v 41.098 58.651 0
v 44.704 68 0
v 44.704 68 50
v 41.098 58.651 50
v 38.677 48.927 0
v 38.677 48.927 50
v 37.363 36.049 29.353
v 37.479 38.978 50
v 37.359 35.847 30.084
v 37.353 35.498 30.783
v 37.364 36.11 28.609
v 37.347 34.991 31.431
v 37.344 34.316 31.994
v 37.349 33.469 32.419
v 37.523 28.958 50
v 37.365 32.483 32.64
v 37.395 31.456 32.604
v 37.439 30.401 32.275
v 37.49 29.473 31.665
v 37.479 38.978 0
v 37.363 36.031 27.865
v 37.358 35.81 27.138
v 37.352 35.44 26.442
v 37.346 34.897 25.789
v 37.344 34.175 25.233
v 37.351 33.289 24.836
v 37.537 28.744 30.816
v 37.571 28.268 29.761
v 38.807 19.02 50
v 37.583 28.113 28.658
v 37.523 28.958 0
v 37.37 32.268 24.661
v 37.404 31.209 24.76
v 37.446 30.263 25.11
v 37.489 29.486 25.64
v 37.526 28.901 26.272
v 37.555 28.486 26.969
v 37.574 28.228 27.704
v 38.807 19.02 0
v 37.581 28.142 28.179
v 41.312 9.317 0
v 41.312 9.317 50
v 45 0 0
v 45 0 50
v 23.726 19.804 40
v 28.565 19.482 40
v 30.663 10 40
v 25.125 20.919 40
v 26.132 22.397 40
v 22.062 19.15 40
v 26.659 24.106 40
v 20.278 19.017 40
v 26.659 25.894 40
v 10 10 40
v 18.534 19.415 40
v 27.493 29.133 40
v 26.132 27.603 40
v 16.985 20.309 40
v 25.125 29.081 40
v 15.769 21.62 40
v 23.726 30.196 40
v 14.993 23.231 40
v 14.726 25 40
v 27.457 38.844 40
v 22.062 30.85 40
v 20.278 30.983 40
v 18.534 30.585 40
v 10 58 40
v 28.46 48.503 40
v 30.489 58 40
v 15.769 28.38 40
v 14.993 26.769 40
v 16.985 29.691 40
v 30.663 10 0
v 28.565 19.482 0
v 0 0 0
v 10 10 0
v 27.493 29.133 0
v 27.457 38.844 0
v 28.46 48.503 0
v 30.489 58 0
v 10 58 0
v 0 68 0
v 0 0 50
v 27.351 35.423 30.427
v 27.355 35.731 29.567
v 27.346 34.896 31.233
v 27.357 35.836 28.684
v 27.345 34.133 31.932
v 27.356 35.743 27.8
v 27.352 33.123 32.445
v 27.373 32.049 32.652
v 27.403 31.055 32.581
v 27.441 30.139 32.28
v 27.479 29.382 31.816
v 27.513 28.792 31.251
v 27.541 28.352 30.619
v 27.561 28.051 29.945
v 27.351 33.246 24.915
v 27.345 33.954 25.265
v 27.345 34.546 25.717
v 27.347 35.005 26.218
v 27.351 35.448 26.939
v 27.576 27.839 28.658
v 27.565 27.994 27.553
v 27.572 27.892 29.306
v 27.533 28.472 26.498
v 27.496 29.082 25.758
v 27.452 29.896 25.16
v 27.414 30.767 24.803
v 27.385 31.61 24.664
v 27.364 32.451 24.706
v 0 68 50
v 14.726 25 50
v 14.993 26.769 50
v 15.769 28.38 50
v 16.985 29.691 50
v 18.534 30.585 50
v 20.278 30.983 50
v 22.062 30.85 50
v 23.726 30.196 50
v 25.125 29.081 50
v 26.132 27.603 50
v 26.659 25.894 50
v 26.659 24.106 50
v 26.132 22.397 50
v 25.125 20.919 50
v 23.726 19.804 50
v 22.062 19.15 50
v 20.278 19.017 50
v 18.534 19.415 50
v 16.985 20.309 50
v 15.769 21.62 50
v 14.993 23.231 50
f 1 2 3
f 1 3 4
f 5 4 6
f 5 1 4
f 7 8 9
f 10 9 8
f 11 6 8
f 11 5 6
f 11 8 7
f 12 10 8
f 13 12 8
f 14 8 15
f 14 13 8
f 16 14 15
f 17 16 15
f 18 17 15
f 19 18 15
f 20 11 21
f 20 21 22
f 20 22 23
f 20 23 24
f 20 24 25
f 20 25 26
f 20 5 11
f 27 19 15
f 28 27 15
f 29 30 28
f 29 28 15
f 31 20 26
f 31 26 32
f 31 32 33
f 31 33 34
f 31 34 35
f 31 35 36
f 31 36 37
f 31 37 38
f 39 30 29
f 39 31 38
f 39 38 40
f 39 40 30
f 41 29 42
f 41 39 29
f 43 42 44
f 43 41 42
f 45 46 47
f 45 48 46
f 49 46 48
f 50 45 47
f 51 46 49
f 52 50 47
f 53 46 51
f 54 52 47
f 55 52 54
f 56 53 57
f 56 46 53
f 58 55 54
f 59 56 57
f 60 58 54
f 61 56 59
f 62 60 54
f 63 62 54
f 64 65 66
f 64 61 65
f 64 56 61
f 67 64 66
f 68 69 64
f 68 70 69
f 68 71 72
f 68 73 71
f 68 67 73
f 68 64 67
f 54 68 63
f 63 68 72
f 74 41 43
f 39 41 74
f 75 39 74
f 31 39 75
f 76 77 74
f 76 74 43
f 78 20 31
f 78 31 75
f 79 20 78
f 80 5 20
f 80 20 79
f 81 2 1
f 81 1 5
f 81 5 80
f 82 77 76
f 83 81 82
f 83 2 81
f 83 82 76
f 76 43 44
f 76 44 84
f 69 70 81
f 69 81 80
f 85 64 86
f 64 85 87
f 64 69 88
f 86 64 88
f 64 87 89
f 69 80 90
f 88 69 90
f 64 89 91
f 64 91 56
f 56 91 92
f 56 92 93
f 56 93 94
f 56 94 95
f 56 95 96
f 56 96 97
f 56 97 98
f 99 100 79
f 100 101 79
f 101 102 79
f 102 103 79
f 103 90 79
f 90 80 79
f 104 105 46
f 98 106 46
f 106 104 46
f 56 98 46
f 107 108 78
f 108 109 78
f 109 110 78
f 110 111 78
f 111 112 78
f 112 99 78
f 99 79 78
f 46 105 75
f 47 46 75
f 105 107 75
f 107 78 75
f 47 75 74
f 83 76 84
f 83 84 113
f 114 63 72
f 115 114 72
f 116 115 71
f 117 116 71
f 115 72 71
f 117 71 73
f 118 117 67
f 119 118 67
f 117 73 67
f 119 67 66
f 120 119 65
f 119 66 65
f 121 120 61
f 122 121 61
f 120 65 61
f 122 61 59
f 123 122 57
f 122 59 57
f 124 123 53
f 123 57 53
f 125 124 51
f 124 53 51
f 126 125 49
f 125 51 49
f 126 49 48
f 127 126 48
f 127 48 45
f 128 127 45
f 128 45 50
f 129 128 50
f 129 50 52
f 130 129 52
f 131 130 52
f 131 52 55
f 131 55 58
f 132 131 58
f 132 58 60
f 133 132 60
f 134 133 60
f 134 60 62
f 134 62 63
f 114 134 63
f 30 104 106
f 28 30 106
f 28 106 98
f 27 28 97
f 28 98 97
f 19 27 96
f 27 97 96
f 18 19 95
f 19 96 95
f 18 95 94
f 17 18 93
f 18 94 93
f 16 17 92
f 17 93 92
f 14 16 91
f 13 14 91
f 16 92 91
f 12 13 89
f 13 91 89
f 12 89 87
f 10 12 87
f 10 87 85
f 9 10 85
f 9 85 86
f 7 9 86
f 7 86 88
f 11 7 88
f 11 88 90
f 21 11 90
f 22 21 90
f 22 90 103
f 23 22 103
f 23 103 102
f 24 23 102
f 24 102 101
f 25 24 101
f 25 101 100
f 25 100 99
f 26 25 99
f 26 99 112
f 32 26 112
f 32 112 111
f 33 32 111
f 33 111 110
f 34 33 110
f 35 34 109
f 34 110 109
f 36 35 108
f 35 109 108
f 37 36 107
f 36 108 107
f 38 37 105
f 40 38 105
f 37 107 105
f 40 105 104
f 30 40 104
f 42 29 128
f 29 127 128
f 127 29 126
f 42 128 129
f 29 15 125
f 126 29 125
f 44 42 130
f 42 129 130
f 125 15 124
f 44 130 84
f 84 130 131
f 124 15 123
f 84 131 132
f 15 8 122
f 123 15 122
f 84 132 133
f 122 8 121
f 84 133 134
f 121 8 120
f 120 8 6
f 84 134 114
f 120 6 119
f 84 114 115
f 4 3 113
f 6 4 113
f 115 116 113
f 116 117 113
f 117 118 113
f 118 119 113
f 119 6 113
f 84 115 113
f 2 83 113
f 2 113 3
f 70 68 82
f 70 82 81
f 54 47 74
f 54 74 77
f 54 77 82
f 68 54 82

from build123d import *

# Parameters (mm, degrees)
BOSS_EXTRU_1_DEPTH                = 50
COQUE2_T                          = -10
TROU_TARAUD_0_801_D               = 12
TROU_DE_PASSAGE_D_AXE_3_321_D     = 8.0000094
TROU_DE_PASSAGE_D_AXE_3_321_DEPTH = 10


with BuildPart() as part:
    # Esquisse1 → Boss.-Extru.1 (new body)
    with BuildSketch(Plane.XY):
        with BuildLine():
            Line((0, 0), (0, 68))
            Line((0, 68), (44.704064579, 68))
            ThreePointArc((44.704064579, 68), (37.345127658, 33.967330015), (45, 0))
            Line((45, 0), (0, 0))
        make_face()
    extrude(amount=BOSS_EXTRU_1_DEPTH)

    # Coque2
    coque2_openings = [part.faces().sort_by_distance(p)[0] for p in [
        (19.961549488, 33.959529951, 0),
    ]]
    offset(amount=COQUE2_T, openings=coque2_openings, kind=Kind.INTERSECTION)

    # Trou taraudé #0-801 (through all)
    with Locations(Plane.XY.offset(50)):
        with Locations((20.726437539, 25)):
            Hole(TROU_TARAUD_0_801_D / 2)

    # Trou de passage d'axe 3/321
    with Locations(Plane(origin=(37.374610437, 32.108761201, 28.657882027), x_dir=(-0.027368282342, 0.999625418405, 0), z_dir=(0.999625418405, 0.027368282342, 0))):
        with Locations((0, 0)):
            Hole(TROU_DE_PASSAGE_D_AXE_3_321_D / 2, depth=TROU_DE_PASSAGE_D_AXE_3_321_DEPTH)


solid = part.part
